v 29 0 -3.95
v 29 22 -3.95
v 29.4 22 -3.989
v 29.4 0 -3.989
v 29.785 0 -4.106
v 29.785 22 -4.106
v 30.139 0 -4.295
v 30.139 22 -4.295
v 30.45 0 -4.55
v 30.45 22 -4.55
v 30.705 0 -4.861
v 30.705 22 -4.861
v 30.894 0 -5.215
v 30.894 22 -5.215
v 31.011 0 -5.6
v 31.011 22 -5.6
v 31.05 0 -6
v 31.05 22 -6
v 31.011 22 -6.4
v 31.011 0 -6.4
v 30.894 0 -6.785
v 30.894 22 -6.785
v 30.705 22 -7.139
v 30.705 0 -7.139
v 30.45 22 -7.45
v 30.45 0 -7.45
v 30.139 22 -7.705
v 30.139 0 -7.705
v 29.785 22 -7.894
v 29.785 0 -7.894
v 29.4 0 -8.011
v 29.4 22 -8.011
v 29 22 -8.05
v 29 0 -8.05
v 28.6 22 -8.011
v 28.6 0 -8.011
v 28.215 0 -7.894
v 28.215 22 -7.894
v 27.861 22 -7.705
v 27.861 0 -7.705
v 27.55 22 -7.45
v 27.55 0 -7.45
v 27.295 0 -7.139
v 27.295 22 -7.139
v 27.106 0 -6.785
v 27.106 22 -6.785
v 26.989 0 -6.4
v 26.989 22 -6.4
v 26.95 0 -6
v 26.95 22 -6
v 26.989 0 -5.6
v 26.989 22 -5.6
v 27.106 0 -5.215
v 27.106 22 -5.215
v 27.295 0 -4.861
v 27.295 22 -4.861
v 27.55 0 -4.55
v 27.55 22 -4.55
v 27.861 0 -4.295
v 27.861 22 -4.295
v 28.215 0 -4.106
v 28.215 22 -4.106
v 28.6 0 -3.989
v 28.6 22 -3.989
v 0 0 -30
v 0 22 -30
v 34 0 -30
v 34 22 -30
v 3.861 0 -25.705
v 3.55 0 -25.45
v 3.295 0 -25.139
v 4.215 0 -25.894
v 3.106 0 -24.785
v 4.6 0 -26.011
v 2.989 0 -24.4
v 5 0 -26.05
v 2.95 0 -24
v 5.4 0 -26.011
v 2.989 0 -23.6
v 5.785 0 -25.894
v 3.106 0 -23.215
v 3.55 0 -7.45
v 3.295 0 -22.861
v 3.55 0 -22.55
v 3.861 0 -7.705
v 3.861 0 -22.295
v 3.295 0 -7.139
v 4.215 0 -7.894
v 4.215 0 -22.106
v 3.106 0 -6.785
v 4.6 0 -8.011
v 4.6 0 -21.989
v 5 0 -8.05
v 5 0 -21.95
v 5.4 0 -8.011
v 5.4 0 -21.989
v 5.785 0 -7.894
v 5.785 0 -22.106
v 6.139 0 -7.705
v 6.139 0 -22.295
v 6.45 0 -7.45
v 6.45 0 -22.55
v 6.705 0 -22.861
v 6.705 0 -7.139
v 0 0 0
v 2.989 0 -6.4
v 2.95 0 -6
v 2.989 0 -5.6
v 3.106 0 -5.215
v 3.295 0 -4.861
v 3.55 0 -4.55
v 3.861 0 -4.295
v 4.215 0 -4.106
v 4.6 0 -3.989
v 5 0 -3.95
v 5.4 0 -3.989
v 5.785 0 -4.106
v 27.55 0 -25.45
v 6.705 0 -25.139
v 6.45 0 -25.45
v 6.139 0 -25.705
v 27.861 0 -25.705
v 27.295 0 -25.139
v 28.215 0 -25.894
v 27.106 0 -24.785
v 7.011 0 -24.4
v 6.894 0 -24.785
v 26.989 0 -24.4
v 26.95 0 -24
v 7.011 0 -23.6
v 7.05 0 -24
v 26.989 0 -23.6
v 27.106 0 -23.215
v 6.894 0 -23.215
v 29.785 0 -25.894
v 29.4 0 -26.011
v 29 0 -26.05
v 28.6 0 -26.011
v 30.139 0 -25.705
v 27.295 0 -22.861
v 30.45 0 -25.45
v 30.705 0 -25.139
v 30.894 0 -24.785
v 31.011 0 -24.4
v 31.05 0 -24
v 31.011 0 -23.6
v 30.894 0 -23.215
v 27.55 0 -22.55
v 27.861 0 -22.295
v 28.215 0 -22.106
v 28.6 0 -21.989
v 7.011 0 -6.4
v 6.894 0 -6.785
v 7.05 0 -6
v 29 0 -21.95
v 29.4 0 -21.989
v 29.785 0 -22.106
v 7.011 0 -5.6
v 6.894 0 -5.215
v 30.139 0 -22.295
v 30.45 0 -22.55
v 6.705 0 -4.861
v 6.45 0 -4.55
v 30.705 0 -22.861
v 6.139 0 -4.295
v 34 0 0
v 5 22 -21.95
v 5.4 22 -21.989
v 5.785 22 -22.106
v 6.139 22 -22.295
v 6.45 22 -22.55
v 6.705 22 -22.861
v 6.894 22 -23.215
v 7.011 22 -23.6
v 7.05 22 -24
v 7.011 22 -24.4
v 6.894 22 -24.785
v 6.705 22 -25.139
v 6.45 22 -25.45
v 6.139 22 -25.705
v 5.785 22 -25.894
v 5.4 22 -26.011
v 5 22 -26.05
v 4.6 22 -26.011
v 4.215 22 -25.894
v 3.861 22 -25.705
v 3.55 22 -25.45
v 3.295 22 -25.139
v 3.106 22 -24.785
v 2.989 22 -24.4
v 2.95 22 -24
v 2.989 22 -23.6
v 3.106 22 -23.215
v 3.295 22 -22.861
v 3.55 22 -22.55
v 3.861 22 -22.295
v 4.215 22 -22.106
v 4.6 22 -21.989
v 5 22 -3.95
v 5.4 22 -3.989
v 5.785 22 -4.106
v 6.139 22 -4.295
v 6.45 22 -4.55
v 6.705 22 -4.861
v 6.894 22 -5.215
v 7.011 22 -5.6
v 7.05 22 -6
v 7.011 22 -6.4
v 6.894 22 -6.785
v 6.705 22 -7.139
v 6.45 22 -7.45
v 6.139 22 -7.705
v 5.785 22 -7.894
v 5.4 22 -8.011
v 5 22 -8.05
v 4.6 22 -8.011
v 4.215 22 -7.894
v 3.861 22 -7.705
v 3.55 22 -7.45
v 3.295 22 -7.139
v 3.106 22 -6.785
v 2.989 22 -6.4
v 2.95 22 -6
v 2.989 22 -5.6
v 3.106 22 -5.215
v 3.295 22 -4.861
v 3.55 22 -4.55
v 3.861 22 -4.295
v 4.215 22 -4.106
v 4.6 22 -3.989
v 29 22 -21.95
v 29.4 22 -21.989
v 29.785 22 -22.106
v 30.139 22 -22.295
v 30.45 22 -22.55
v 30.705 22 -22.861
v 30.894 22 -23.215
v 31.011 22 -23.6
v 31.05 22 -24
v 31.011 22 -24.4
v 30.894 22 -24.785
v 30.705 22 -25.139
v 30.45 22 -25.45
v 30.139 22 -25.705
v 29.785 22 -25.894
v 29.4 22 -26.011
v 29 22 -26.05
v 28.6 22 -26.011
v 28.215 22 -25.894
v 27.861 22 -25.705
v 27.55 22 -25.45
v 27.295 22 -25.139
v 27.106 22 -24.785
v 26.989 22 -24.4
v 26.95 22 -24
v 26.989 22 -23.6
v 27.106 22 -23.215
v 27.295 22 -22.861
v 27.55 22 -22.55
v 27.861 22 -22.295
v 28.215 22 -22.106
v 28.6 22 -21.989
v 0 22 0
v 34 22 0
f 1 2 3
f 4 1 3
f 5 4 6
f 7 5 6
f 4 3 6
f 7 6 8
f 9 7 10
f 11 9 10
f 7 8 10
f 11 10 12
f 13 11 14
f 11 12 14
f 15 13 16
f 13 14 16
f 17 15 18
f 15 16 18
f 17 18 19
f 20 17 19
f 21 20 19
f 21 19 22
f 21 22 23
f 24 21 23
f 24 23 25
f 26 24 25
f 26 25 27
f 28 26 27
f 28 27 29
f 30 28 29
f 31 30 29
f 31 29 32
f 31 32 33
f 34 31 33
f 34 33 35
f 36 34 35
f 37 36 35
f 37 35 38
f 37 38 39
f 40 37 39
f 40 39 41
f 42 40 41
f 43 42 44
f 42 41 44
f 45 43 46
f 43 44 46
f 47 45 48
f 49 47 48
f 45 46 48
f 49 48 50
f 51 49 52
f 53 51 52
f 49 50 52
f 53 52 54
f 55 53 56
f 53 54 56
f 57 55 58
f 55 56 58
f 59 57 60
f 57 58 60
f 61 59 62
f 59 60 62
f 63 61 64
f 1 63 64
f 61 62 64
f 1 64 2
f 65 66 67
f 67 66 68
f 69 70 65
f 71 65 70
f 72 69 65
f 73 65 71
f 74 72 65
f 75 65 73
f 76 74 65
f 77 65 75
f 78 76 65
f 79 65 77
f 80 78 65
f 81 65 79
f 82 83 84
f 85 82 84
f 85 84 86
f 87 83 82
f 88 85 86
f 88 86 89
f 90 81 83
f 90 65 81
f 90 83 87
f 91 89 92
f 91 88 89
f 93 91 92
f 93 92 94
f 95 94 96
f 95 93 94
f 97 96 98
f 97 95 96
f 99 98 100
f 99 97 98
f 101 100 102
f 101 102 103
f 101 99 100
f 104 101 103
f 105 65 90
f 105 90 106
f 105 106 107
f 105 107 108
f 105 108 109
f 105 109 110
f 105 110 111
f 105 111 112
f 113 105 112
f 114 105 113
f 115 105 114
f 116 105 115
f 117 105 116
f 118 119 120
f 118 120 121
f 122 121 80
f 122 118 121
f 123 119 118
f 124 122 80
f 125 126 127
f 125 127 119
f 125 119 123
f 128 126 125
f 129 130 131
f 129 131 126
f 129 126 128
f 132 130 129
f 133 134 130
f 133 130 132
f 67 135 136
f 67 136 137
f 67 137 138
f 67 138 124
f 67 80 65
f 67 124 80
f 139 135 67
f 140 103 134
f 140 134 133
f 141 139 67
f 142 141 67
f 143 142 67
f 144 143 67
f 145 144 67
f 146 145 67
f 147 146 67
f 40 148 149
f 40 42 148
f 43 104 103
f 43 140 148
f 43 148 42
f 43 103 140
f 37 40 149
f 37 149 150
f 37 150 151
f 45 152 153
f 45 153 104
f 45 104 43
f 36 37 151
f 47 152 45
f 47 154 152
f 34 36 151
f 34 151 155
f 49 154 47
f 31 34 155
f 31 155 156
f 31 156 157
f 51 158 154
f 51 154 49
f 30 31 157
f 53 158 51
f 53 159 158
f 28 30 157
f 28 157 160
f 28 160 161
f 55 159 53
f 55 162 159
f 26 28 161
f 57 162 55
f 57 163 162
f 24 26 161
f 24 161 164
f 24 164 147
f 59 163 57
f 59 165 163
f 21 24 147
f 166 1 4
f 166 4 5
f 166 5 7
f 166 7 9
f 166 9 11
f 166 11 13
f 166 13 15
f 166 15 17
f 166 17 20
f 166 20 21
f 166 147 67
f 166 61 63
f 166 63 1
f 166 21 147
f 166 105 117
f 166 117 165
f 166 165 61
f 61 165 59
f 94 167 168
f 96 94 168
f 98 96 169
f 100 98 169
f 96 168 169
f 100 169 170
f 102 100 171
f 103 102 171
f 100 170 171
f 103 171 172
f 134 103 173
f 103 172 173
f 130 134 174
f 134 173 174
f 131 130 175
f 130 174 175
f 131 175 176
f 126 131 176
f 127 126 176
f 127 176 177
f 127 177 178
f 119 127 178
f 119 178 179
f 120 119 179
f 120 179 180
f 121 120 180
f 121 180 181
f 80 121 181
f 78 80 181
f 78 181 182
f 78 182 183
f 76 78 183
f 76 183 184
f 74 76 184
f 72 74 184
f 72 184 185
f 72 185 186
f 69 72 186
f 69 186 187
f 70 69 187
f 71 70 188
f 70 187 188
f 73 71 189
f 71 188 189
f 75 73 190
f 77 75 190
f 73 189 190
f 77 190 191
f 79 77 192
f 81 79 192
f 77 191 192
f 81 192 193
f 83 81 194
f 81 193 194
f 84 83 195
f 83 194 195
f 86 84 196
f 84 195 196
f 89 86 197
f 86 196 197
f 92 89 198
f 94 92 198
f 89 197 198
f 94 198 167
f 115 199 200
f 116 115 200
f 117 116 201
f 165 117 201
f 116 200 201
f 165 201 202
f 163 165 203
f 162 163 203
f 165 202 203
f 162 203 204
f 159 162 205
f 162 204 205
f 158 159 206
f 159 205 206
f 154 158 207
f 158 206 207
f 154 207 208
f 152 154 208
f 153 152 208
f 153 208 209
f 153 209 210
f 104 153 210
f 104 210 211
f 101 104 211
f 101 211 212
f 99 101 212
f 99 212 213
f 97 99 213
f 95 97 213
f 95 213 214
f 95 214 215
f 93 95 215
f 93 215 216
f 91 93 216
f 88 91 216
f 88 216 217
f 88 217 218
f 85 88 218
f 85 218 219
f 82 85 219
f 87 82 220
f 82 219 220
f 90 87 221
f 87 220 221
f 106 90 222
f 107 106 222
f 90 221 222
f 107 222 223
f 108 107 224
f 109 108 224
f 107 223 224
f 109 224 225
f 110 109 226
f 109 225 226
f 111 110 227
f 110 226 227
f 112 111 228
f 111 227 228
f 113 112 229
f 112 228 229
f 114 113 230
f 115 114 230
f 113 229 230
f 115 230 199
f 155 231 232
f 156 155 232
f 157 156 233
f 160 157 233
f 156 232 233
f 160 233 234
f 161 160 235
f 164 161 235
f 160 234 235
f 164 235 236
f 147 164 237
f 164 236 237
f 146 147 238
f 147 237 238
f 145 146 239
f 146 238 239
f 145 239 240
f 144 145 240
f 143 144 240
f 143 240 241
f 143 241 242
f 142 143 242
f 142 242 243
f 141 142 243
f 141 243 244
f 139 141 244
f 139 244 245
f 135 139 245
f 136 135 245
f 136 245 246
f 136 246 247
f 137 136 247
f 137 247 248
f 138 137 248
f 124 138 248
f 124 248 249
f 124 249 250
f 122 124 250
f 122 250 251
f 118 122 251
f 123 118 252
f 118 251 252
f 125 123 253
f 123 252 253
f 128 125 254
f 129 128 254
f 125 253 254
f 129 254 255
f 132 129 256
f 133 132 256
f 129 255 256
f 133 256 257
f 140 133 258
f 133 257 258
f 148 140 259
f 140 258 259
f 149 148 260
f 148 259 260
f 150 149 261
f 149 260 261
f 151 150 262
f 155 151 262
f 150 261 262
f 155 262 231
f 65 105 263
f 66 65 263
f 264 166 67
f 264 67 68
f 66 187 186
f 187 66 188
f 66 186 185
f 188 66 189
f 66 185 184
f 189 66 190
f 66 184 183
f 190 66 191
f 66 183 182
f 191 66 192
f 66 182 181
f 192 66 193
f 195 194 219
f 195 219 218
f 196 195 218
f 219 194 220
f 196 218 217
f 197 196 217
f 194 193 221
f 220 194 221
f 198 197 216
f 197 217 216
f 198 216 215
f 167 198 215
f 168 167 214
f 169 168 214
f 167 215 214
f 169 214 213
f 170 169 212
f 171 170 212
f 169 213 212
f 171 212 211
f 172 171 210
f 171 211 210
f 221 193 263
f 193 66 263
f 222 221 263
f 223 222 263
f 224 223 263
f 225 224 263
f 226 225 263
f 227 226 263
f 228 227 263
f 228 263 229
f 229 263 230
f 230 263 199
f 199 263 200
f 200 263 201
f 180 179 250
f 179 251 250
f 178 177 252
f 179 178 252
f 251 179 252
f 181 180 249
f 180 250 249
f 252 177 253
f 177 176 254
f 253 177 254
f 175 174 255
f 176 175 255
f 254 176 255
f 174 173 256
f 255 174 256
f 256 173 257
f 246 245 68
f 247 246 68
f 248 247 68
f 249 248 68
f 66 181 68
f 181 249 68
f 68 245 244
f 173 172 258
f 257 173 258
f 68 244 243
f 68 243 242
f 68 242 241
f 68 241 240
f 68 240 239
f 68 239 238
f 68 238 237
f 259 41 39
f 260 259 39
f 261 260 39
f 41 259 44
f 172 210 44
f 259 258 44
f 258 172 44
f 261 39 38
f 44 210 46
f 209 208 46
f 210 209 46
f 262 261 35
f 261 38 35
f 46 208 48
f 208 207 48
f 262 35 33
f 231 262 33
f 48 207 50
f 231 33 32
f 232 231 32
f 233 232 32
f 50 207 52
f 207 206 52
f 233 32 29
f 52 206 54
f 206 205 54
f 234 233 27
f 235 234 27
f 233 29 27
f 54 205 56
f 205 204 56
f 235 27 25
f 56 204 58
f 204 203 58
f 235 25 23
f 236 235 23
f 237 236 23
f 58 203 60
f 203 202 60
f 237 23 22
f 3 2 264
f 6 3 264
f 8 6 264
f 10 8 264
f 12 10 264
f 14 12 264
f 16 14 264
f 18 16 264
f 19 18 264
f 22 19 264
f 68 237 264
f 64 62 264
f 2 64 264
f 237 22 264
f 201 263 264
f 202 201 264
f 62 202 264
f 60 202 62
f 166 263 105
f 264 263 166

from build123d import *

# Parameters (mm, degrees)
SKETCH2_W           = 34
SKETCH2_H           = 22
BOSS_EXTRUDE1_DEPTH = 30
SKETCH3_R           = 2.05
CUT_EXTRUDE1_DEPTH  = 30


with BuildPart() as part:
    # Sketch2 → Boss-Extrude1 (new body)
    with BuildSketch(Plane.XY):
        with Locations((17, 11)):
            Rectangle(SKETCH2_W, SKETCH2_H)
    extrude(amount=-BOSS_EXTRUDE1_DEPTH)

    # Sketch3 → Cut-Extrude1 (cut)
    with BuildSketch(Plane(origin=(0, 22, 0), x_dir=(1, 0, 0), z_dir=(0, 1, 0))):
        with Locations(Location((29, 6, 0), (0, 0, 270))):
            Circle(SKETCH3_R)
        with Locations(Location((5, 6, 0), (0, 0, 270))):
            Circle(SKETCH3_R)
        with Locations(Location((5, 24, 0), (0, 0, 270))):
            Circle(SKETCH3_R)
        with Locations(Location((29, 24, 0), (0, 0, 270))):
            Circle(SKETCH3_R)
    extrude(amount=-CUT_EXTRUDE1_DEPTH, mode=Mode.SUBTRACT)


solid = part.part
